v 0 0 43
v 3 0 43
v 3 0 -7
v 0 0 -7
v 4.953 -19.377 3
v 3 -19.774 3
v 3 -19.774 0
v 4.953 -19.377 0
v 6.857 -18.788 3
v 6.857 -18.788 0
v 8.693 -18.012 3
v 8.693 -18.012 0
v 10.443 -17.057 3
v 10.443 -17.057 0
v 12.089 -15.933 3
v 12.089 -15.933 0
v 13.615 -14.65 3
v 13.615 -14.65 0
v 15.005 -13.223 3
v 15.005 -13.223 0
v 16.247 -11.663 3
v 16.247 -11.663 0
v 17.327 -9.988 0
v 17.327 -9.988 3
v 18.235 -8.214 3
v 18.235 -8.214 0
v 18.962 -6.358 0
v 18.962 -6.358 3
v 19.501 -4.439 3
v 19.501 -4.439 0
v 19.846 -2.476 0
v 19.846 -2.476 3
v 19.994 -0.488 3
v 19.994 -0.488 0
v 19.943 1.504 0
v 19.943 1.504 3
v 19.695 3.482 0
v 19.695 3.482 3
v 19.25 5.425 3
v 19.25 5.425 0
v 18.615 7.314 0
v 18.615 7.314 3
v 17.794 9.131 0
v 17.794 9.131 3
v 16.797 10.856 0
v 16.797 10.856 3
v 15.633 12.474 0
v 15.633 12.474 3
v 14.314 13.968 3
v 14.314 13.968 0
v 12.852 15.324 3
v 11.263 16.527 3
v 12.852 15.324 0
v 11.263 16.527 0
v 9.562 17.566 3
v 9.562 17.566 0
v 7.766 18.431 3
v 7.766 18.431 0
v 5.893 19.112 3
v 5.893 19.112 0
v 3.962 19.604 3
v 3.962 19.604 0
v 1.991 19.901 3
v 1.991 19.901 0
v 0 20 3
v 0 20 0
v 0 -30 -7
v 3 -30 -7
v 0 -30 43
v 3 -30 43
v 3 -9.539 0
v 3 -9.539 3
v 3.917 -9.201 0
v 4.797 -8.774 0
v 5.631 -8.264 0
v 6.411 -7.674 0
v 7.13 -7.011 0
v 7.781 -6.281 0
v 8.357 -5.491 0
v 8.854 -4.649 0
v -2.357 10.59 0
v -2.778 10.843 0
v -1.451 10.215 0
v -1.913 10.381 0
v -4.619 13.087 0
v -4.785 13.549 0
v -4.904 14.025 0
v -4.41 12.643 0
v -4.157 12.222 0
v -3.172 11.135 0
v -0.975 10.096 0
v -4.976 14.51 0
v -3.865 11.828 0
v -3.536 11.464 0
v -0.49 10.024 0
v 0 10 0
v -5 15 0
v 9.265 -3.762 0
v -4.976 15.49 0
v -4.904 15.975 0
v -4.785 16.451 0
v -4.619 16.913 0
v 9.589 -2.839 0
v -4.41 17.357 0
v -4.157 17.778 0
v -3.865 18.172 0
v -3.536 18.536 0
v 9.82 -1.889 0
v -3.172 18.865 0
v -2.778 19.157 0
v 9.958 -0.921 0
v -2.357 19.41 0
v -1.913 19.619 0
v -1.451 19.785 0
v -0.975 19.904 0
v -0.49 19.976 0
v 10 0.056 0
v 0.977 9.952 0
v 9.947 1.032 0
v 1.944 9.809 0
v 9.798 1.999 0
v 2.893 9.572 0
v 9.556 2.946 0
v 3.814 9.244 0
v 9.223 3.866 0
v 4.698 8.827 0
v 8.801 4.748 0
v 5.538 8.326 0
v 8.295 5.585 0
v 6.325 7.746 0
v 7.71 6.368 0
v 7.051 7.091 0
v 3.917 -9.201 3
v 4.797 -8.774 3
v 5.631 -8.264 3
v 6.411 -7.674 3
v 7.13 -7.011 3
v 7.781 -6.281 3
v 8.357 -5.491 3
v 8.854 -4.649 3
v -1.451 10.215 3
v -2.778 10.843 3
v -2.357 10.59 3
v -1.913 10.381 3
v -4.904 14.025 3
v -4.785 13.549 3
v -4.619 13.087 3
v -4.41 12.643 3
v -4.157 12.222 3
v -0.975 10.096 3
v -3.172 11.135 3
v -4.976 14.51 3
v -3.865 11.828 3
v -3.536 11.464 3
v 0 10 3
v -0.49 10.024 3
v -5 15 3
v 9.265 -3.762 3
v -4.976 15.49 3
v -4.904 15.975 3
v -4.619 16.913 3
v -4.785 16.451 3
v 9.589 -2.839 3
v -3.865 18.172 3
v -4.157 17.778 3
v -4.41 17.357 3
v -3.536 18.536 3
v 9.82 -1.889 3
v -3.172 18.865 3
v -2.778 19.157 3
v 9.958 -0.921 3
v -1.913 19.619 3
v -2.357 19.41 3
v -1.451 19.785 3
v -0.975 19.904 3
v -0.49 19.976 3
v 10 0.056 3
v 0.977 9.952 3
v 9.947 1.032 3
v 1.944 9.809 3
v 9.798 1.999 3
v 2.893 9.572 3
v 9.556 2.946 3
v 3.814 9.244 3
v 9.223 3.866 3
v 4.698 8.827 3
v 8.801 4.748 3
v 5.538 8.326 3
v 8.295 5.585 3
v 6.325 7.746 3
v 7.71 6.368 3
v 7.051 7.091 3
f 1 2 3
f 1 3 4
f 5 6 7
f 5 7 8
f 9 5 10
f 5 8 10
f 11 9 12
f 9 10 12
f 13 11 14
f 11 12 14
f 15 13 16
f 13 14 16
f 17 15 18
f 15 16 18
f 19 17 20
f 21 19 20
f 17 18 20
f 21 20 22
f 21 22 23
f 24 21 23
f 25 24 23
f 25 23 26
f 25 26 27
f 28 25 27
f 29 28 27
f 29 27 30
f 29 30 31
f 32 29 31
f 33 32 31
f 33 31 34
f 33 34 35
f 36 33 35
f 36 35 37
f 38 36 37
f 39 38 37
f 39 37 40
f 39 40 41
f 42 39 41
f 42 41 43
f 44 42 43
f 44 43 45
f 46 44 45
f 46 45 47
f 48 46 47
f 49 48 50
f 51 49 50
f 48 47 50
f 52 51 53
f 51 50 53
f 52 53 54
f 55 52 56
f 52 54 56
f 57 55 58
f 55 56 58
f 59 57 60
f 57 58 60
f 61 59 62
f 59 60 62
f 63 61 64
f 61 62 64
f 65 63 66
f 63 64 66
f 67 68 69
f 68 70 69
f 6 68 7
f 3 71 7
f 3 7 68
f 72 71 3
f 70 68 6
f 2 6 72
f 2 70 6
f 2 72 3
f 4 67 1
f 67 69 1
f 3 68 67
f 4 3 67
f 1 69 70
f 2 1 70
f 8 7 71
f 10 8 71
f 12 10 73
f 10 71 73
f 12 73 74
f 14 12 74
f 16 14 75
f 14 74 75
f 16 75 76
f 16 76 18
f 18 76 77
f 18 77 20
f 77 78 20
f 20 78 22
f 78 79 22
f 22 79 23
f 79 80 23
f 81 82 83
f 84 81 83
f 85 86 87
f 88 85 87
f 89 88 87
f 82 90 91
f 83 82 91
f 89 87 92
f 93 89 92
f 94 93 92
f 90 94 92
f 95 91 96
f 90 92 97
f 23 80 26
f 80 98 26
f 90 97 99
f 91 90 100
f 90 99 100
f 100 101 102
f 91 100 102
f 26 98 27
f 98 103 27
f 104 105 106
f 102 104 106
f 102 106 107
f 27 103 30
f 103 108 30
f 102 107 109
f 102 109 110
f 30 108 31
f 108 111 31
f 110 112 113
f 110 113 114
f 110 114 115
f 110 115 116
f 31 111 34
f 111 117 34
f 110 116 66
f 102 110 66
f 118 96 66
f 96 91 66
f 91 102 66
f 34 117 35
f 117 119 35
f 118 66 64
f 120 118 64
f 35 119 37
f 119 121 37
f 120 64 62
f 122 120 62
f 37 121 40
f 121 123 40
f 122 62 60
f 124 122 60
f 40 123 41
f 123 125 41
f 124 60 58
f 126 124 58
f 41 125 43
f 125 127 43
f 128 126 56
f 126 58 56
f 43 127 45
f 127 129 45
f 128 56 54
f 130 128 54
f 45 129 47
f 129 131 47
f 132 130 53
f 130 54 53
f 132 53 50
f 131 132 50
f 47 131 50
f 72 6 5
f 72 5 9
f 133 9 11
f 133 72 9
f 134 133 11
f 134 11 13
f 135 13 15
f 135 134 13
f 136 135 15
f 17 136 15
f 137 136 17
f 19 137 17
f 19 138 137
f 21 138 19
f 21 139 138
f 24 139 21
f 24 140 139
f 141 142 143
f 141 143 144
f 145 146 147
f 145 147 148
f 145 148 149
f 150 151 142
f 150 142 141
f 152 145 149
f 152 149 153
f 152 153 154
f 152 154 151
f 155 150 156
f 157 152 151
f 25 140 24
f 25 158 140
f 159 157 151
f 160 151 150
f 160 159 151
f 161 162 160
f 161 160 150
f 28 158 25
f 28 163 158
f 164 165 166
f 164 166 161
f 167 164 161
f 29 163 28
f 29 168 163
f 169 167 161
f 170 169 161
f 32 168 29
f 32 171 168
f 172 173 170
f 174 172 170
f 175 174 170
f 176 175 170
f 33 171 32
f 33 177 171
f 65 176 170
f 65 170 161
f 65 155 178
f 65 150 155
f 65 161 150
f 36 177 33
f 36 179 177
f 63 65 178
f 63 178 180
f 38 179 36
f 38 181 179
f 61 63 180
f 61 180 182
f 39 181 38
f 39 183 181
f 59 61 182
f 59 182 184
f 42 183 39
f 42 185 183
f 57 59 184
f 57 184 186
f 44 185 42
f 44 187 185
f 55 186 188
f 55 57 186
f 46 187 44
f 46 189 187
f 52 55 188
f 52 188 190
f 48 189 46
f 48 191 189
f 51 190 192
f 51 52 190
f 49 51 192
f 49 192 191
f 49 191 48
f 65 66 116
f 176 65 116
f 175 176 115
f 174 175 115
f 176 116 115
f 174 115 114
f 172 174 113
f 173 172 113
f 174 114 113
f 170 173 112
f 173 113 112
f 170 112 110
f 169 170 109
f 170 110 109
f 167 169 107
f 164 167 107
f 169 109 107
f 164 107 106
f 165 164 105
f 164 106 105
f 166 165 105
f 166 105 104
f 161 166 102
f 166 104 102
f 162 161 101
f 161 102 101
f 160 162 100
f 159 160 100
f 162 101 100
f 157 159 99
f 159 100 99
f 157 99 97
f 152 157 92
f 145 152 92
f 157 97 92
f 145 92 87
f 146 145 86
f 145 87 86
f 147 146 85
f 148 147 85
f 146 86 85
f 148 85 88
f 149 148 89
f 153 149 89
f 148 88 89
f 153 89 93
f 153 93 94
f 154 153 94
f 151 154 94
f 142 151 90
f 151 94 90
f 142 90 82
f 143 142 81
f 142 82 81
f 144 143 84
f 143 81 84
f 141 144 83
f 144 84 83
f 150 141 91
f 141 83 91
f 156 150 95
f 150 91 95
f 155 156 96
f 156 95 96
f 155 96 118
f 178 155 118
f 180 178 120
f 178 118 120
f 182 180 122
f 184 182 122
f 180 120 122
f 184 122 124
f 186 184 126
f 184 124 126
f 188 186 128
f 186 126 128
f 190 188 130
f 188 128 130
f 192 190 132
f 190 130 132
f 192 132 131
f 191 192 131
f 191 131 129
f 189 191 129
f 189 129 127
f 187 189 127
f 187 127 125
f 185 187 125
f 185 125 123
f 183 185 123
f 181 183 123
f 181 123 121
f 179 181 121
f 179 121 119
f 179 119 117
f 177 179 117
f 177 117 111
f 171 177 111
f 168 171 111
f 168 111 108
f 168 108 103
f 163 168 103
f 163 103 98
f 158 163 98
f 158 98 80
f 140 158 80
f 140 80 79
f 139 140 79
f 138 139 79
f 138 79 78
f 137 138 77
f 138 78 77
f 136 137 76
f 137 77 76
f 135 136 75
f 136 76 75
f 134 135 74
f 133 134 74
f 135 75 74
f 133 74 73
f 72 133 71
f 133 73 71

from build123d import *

# Parameters (mm, degrees)
BOSS_EXTRUDE1_DEPTH = 3
SKETCH2_W           = 3
SKETCH2_H           = 10
BOSS_EXTRUDE2_DEPTH = 3
SKETCH3_W           = 3
SKETCH3_H           = 3
BOSS_EXTRUDE3_DEPTH = 20
SKETCH4_W           = 3
SKETCH4_H           = 3
BOSS_EXTRUDE4_DEPTH = 10
SKETCH5_W           = 3
SKETCH5_H           = 30
BOSS_EXTRUDE5_DEPTH = 40
SKETCH6_W           = 3
SKETCH6_H           = 30
BOSS_EXTRUDE6_DEPTH = 7


with BuildPart() as part:
    # Sketch1 → Boss-Extrude1 (new body)
    with BuildSketch(Plane.XY):
        with BuildLine():
            ThreePointArc((0, 20), (-5, 15), (0, 10))
            ThreePointArc((0, 10), (10, 0), (0, -10))
            Line((0, -10), (0, -20))
            ThreePointArc((0, -20), (20, 0), (0, 20))
        make_face()
    extrude(amount=BOSS_EXTRUDE1_DEPTH)

    # Sketch2 → Boss-Extrude2 (add)
    with BuildSketch(Plane.ZY):
        with Locations((1.5, -15)):
            Rectangle(SKETCH2_W, SKETCH2_H)
    extrude(amount=-BOSS_EXTRUDE2_DEPTH)

    # Sketch3 → Boss-Extrude3 (add)
    with BuildSketch(Plane(origin=(0, -20, 0), x_dir=(-1, 0, 0), z_dir=(0, -1, 0))):
        with Locations((-1.5, -1.5)):
            Rectangle(SKETCH3_W, SKETCH3_H)
    extrude(amount=-BOSS_EXTRUDE3_DEPTH)

    # Sketch4 → Boss-Extrude4 (add)
    with BuildSketch(Plane.XZ.offset(20)):
        with Locations((1.5, 1.5)):
            Rectangle(SKETCH4_W, SKETCH4_H)
    extrude(amount=BOSS_EXTRUDE4_DEPTH)

    # Sketch5 → Boss-Extrude5 (add)
    with BuildSketch(Plane.XY.offset(3)):
        with Locations((1.5, -15)):
            Rectangle(SKETCH5_W, SKETCH5_H)
    extrude(amount=BOSS_EXTRUDE5_DEPTH)

    # Sketch6 → Boss-Extrude6 (add)
    with BuildSketch(Plane(origin=(0, 0, 0), x_dir=(-1, 0, 0), z_dir=(0, 0, -1))):
        with Locations((-1.5, -15)):
            Rectangle(SKETCH6_W, SKETCH6_H)
    extrude(amount=BOSS_EXTRUDE6_DEPTH)


solid = part.part
